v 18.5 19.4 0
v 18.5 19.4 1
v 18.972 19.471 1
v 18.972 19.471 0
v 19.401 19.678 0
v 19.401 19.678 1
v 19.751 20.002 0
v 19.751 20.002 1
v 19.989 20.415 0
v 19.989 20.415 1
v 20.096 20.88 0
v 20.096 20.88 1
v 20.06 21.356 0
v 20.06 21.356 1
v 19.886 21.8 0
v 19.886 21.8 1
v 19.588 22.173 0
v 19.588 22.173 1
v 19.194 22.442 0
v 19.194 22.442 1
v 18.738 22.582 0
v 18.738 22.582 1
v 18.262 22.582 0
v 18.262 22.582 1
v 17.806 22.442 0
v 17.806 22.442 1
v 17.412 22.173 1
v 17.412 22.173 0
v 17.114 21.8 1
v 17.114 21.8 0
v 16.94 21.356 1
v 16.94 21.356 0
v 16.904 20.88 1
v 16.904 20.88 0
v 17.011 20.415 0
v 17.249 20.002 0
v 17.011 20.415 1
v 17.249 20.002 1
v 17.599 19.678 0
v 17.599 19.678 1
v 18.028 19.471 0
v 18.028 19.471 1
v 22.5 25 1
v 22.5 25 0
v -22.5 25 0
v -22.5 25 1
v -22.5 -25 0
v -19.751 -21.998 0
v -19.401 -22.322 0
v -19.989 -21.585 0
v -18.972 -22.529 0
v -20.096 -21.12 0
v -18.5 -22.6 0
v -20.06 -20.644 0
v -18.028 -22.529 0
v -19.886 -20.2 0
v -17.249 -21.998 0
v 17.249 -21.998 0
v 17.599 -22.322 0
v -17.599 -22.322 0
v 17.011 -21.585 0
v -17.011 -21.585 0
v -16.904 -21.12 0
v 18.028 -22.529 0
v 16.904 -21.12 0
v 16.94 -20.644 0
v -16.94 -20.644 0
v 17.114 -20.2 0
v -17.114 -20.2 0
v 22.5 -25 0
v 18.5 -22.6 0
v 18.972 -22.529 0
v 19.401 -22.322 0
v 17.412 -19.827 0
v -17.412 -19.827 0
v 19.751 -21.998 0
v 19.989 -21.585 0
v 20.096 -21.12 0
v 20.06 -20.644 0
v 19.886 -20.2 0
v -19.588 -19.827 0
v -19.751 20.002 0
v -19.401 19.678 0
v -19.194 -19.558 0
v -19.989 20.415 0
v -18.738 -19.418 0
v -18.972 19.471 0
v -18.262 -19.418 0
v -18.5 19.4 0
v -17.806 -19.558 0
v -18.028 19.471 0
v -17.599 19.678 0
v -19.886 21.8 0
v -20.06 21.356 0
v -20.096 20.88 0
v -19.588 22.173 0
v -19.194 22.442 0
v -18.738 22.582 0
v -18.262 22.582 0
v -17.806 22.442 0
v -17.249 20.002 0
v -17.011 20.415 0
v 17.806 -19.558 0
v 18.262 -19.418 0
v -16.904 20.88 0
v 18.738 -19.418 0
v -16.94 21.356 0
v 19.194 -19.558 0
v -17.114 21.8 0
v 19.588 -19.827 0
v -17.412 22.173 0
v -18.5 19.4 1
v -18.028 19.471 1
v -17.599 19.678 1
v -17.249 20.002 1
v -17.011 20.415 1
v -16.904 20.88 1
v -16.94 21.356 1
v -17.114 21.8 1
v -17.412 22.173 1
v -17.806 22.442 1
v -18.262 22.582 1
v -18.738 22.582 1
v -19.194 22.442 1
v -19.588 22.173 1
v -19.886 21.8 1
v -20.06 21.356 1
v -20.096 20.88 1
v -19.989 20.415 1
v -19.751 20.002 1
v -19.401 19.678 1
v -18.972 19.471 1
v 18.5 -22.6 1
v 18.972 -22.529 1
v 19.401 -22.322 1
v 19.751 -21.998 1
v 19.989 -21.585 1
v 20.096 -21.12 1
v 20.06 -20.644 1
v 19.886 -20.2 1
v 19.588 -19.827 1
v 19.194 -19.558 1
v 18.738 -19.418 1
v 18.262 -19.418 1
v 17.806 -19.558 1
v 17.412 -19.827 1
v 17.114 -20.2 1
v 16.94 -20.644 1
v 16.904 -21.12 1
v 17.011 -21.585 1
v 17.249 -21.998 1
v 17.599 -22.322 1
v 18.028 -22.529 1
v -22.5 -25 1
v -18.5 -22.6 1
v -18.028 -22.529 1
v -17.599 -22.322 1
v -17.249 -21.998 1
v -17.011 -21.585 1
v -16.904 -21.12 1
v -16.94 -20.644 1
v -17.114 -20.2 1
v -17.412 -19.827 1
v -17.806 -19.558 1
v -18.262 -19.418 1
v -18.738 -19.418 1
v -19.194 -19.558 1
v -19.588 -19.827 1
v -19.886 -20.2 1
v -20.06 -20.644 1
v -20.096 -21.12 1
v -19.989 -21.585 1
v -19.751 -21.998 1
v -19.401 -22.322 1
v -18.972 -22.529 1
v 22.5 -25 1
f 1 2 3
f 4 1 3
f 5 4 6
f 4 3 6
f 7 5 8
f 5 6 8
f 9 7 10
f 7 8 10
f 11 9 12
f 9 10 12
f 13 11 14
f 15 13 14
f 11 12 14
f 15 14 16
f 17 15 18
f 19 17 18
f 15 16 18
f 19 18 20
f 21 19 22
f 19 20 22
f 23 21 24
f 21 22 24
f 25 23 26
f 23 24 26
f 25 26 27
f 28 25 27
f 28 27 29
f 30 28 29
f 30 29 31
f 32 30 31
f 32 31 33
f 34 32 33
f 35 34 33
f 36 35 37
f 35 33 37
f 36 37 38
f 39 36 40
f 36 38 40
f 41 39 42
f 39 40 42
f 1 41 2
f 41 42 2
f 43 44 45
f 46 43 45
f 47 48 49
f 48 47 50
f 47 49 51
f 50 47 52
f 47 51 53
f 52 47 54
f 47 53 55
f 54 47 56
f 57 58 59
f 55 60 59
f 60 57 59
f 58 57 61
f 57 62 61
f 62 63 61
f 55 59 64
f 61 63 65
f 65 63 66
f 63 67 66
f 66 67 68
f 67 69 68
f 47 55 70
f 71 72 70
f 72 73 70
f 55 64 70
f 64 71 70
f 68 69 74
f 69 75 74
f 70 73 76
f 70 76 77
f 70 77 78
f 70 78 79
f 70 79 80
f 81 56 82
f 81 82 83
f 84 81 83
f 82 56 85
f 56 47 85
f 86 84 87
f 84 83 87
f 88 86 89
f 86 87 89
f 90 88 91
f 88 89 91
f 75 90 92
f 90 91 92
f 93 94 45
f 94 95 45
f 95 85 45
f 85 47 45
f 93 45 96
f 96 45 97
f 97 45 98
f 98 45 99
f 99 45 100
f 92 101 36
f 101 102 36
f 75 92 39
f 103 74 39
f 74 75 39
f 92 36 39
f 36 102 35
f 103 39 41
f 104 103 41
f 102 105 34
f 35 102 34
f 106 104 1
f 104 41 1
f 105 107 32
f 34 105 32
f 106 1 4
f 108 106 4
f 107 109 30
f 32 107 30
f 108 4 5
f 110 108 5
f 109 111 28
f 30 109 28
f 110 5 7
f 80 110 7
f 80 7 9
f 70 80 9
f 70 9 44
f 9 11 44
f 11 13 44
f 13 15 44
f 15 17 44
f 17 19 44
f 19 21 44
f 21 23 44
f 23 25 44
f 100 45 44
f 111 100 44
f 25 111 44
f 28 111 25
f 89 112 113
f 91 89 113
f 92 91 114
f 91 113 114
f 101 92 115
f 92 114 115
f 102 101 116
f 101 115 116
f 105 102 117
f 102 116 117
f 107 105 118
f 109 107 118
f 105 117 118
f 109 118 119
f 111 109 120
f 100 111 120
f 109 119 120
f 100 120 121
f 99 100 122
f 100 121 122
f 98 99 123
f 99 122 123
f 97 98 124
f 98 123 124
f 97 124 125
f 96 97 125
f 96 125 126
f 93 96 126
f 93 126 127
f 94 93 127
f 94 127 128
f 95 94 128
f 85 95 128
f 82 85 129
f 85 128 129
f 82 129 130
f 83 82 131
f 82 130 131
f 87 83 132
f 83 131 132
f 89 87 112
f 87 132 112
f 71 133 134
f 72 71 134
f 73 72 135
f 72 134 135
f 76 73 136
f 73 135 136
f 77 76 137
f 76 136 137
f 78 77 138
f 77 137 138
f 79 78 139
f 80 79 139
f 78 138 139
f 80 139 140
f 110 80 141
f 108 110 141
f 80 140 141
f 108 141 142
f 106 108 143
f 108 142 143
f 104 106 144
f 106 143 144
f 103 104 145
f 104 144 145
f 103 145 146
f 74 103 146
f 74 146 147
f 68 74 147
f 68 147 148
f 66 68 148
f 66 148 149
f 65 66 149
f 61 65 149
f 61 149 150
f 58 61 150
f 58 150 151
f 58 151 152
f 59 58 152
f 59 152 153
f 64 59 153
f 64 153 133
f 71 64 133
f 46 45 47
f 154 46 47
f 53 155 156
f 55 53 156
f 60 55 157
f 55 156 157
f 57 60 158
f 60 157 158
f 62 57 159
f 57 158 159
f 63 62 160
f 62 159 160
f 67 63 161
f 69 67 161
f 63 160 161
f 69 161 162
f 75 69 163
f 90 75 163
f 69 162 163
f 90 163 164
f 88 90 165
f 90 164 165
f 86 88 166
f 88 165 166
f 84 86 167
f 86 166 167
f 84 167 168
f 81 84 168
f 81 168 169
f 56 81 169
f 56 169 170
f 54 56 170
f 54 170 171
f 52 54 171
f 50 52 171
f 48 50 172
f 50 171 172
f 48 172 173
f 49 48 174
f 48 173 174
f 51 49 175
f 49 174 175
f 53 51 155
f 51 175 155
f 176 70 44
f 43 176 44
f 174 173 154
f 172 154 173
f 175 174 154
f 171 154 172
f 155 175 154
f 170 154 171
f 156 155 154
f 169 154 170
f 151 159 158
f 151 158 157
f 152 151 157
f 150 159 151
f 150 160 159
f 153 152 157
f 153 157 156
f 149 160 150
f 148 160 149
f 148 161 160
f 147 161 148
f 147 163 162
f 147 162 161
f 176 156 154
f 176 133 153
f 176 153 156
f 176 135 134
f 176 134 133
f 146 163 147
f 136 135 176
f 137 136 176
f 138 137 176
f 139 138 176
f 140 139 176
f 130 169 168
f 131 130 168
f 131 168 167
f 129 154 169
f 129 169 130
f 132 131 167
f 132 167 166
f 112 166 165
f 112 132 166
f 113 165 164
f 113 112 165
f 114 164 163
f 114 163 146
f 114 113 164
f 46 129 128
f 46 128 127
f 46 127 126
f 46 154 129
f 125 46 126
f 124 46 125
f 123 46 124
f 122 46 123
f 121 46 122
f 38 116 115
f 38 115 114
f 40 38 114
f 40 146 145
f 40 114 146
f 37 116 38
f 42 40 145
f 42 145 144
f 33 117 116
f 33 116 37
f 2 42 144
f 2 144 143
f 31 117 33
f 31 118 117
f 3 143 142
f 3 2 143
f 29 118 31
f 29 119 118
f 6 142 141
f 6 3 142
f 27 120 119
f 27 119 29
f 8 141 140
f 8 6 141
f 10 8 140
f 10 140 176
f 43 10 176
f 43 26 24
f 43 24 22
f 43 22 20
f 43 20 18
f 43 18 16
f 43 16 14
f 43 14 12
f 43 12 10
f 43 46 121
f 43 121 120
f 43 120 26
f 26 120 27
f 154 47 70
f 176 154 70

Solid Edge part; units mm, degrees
sketch "Sketch1" plane through (0, 0, 0) normal (0, 0, 1) x (1, 0, 0)
  line L0 (-22.5, -25) -> (22.5, -25)
  line L1 (22.5, -25) -> (22.5, 25)
  line L2 (22.5, 25) -> (-22.5, 25)
  line L3 (-22.5, 25) -> (-22.5, -25)
  dimension "D1" = 45
  dimension "D2" = 50
extrude "Protrusion1" add sketch "Sketch1" along normal blind 1
hole "Hole_1" at (-18.5, 21, 1) direction (0, 0, -1) diameter 3.2 end up to next
hole "Hole1" at (18.5, 21, 1) direction (0, 0, -1) diameter 3.2 end up to next
hole "Hole2" at (18.5, -21, 1) direction (0, 0, -1) diameter 3.2 end up to next
hole "Hole3" at (-18.5, -21, 1) direction (0, 0, -1) diameter 3.2 end up to next
properties material "Polyethylene, low density"
